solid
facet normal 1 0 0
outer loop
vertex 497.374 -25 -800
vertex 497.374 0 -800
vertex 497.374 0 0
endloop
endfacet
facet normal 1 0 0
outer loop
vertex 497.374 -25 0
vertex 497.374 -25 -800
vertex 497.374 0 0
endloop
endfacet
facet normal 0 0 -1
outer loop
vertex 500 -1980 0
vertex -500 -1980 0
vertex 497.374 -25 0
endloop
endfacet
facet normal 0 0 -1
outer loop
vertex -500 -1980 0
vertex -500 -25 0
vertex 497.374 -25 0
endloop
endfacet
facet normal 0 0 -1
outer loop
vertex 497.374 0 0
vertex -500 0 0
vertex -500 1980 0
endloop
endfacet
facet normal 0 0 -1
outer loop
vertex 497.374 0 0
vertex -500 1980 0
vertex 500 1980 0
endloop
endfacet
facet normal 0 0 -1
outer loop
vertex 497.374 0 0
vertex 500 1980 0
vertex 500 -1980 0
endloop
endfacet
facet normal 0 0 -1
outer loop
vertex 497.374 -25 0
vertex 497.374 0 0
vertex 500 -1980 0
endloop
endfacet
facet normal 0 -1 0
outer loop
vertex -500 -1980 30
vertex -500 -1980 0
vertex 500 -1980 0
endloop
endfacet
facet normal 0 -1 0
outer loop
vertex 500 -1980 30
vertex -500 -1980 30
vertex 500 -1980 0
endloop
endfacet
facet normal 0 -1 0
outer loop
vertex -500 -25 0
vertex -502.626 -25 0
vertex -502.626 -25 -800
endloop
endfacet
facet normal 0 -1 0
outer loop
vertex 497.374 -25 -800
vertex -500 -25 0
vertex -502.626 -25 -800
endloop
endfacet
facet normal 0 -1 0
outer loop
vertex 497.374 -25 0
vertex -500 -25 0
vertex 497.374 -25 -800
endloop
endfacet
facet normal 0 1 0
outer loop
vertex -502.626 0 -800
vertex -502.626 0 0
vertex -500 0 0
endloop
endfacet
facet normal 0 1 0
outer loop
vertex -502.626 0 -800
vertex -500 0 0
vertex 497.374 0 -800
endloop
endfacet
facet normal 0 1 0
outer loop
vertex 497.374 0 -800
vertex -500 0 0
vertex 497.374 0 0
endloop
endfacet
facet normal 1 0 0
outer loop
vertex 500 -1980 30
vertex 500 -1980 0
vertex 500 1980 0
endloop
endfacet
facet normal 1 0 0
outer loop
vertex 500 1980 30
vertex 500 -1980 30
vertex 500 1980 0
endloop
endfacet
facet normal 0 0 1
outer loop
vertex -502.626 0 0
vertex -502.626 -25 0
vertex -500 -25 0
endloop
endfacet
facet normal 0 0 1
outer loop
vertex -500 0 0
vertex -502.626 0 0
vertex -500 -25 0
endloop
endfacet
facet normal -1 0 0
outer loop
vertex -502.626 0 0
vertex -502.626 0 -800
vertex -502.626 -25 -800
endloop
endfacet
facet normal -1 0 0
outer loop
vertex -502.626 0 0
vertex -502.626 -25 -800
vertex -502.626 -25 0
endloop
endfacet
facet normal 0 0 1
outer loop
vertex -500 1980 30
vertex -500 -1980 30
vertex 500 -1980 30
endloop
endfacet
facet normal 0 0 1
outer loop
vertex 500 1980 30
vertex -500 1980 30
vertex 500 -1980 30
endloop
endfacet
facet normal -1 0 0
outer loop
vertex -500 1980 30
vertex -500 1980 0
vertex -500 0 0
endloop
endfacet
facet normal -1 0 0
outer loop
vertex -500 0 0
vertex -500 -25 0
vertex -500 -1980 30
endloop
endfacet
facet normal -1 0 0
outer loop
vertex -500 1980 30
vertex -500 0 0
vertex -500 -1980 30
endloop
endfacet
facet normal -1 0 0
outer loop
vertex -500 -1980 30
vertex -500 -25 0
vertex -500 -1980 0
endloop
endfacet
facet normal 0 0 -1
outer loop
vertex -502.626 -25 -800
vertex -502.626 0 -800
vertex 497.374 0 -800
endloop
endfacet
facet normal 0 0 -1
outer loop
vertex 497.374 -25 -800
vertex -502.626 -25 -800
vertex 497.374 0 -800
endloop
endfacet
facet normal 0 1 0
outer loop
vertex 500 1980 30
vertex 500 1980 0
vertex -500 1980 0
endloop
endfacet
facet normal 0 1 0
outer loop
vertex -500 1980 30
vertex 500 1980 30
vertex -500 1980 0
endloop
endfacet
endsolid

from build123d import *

# Parameters (mm, degrees)
F3_DEPTH = 30
F1_W     = 1000
F1_H     = 800
F4_DEPTH = 25


# Not quite as in the source:
# - the program builds the solid bodies; features that only make, move or delete a surface that nothing else refers to are left out


with BuildPart() as f3:
    # F0 (on Top) → F3 (new body)
    with BuildSketch(Plane.XY):
        Polygon((500, 0), (500, 500), (-24.3693755725, 500), align=None)
        Polygon((-24.3693755725, 500), (500, 500), (500, 1250), (-211.1726416889, 1250), (-500, 953.5263180733), align=None)
        Polygon((500, 0), (-24.3693755725, 500), (-500, 500), (-500, -500), (-71.4285714286, -500), align=None)
        Polygon((-500, 500), (-24.3693755725, 500), (-500, 953.5263180733), align=None)
        Polygon((500, -500), (500, 0), (-71.4285714286, -500), align=None)
        Polygon((-211.1726416889, 1250), (500, 1250), (500, 1980), align=None)
        Polygon((-500, 1250), (-500, 953.5263180733), (-211.1726416889, 1250), align=None)
        Polygon((500, -1250), (500, -500), (-71.4285714286, -500), (-500, -875), (-160.6334841629, -1250), align=None)
        Polygon((-500, -875), (-71.4285714286, -500), (-500, -500), align=None)
        Polygon((-500, 1250), (-211.1726416889, 1250), (500, 1980), (-500, 1980), align=None)
        Polygon((500, -1980), (500, -1250), (-160.6334841629, -1250), align=None)
        Polygon((-160.6334841629, -1250), (-500, -875), (-500, -1250), align=None)
        Polygon((500, -1980), (-160.6334841629, -1250), (-500, -1250), (-500, -1980), align=None)
    extrude(amount=F3_DEPTH)

    # F1 (on Front) → F4 (join)
    with BuildSketch(Plane.XZ):
        with Locations((-2.6259482768, -400)):
            Rectangle(F1_W, F1_H)
    extrude(amount=F4_DEPTH)


solid = f3.part
